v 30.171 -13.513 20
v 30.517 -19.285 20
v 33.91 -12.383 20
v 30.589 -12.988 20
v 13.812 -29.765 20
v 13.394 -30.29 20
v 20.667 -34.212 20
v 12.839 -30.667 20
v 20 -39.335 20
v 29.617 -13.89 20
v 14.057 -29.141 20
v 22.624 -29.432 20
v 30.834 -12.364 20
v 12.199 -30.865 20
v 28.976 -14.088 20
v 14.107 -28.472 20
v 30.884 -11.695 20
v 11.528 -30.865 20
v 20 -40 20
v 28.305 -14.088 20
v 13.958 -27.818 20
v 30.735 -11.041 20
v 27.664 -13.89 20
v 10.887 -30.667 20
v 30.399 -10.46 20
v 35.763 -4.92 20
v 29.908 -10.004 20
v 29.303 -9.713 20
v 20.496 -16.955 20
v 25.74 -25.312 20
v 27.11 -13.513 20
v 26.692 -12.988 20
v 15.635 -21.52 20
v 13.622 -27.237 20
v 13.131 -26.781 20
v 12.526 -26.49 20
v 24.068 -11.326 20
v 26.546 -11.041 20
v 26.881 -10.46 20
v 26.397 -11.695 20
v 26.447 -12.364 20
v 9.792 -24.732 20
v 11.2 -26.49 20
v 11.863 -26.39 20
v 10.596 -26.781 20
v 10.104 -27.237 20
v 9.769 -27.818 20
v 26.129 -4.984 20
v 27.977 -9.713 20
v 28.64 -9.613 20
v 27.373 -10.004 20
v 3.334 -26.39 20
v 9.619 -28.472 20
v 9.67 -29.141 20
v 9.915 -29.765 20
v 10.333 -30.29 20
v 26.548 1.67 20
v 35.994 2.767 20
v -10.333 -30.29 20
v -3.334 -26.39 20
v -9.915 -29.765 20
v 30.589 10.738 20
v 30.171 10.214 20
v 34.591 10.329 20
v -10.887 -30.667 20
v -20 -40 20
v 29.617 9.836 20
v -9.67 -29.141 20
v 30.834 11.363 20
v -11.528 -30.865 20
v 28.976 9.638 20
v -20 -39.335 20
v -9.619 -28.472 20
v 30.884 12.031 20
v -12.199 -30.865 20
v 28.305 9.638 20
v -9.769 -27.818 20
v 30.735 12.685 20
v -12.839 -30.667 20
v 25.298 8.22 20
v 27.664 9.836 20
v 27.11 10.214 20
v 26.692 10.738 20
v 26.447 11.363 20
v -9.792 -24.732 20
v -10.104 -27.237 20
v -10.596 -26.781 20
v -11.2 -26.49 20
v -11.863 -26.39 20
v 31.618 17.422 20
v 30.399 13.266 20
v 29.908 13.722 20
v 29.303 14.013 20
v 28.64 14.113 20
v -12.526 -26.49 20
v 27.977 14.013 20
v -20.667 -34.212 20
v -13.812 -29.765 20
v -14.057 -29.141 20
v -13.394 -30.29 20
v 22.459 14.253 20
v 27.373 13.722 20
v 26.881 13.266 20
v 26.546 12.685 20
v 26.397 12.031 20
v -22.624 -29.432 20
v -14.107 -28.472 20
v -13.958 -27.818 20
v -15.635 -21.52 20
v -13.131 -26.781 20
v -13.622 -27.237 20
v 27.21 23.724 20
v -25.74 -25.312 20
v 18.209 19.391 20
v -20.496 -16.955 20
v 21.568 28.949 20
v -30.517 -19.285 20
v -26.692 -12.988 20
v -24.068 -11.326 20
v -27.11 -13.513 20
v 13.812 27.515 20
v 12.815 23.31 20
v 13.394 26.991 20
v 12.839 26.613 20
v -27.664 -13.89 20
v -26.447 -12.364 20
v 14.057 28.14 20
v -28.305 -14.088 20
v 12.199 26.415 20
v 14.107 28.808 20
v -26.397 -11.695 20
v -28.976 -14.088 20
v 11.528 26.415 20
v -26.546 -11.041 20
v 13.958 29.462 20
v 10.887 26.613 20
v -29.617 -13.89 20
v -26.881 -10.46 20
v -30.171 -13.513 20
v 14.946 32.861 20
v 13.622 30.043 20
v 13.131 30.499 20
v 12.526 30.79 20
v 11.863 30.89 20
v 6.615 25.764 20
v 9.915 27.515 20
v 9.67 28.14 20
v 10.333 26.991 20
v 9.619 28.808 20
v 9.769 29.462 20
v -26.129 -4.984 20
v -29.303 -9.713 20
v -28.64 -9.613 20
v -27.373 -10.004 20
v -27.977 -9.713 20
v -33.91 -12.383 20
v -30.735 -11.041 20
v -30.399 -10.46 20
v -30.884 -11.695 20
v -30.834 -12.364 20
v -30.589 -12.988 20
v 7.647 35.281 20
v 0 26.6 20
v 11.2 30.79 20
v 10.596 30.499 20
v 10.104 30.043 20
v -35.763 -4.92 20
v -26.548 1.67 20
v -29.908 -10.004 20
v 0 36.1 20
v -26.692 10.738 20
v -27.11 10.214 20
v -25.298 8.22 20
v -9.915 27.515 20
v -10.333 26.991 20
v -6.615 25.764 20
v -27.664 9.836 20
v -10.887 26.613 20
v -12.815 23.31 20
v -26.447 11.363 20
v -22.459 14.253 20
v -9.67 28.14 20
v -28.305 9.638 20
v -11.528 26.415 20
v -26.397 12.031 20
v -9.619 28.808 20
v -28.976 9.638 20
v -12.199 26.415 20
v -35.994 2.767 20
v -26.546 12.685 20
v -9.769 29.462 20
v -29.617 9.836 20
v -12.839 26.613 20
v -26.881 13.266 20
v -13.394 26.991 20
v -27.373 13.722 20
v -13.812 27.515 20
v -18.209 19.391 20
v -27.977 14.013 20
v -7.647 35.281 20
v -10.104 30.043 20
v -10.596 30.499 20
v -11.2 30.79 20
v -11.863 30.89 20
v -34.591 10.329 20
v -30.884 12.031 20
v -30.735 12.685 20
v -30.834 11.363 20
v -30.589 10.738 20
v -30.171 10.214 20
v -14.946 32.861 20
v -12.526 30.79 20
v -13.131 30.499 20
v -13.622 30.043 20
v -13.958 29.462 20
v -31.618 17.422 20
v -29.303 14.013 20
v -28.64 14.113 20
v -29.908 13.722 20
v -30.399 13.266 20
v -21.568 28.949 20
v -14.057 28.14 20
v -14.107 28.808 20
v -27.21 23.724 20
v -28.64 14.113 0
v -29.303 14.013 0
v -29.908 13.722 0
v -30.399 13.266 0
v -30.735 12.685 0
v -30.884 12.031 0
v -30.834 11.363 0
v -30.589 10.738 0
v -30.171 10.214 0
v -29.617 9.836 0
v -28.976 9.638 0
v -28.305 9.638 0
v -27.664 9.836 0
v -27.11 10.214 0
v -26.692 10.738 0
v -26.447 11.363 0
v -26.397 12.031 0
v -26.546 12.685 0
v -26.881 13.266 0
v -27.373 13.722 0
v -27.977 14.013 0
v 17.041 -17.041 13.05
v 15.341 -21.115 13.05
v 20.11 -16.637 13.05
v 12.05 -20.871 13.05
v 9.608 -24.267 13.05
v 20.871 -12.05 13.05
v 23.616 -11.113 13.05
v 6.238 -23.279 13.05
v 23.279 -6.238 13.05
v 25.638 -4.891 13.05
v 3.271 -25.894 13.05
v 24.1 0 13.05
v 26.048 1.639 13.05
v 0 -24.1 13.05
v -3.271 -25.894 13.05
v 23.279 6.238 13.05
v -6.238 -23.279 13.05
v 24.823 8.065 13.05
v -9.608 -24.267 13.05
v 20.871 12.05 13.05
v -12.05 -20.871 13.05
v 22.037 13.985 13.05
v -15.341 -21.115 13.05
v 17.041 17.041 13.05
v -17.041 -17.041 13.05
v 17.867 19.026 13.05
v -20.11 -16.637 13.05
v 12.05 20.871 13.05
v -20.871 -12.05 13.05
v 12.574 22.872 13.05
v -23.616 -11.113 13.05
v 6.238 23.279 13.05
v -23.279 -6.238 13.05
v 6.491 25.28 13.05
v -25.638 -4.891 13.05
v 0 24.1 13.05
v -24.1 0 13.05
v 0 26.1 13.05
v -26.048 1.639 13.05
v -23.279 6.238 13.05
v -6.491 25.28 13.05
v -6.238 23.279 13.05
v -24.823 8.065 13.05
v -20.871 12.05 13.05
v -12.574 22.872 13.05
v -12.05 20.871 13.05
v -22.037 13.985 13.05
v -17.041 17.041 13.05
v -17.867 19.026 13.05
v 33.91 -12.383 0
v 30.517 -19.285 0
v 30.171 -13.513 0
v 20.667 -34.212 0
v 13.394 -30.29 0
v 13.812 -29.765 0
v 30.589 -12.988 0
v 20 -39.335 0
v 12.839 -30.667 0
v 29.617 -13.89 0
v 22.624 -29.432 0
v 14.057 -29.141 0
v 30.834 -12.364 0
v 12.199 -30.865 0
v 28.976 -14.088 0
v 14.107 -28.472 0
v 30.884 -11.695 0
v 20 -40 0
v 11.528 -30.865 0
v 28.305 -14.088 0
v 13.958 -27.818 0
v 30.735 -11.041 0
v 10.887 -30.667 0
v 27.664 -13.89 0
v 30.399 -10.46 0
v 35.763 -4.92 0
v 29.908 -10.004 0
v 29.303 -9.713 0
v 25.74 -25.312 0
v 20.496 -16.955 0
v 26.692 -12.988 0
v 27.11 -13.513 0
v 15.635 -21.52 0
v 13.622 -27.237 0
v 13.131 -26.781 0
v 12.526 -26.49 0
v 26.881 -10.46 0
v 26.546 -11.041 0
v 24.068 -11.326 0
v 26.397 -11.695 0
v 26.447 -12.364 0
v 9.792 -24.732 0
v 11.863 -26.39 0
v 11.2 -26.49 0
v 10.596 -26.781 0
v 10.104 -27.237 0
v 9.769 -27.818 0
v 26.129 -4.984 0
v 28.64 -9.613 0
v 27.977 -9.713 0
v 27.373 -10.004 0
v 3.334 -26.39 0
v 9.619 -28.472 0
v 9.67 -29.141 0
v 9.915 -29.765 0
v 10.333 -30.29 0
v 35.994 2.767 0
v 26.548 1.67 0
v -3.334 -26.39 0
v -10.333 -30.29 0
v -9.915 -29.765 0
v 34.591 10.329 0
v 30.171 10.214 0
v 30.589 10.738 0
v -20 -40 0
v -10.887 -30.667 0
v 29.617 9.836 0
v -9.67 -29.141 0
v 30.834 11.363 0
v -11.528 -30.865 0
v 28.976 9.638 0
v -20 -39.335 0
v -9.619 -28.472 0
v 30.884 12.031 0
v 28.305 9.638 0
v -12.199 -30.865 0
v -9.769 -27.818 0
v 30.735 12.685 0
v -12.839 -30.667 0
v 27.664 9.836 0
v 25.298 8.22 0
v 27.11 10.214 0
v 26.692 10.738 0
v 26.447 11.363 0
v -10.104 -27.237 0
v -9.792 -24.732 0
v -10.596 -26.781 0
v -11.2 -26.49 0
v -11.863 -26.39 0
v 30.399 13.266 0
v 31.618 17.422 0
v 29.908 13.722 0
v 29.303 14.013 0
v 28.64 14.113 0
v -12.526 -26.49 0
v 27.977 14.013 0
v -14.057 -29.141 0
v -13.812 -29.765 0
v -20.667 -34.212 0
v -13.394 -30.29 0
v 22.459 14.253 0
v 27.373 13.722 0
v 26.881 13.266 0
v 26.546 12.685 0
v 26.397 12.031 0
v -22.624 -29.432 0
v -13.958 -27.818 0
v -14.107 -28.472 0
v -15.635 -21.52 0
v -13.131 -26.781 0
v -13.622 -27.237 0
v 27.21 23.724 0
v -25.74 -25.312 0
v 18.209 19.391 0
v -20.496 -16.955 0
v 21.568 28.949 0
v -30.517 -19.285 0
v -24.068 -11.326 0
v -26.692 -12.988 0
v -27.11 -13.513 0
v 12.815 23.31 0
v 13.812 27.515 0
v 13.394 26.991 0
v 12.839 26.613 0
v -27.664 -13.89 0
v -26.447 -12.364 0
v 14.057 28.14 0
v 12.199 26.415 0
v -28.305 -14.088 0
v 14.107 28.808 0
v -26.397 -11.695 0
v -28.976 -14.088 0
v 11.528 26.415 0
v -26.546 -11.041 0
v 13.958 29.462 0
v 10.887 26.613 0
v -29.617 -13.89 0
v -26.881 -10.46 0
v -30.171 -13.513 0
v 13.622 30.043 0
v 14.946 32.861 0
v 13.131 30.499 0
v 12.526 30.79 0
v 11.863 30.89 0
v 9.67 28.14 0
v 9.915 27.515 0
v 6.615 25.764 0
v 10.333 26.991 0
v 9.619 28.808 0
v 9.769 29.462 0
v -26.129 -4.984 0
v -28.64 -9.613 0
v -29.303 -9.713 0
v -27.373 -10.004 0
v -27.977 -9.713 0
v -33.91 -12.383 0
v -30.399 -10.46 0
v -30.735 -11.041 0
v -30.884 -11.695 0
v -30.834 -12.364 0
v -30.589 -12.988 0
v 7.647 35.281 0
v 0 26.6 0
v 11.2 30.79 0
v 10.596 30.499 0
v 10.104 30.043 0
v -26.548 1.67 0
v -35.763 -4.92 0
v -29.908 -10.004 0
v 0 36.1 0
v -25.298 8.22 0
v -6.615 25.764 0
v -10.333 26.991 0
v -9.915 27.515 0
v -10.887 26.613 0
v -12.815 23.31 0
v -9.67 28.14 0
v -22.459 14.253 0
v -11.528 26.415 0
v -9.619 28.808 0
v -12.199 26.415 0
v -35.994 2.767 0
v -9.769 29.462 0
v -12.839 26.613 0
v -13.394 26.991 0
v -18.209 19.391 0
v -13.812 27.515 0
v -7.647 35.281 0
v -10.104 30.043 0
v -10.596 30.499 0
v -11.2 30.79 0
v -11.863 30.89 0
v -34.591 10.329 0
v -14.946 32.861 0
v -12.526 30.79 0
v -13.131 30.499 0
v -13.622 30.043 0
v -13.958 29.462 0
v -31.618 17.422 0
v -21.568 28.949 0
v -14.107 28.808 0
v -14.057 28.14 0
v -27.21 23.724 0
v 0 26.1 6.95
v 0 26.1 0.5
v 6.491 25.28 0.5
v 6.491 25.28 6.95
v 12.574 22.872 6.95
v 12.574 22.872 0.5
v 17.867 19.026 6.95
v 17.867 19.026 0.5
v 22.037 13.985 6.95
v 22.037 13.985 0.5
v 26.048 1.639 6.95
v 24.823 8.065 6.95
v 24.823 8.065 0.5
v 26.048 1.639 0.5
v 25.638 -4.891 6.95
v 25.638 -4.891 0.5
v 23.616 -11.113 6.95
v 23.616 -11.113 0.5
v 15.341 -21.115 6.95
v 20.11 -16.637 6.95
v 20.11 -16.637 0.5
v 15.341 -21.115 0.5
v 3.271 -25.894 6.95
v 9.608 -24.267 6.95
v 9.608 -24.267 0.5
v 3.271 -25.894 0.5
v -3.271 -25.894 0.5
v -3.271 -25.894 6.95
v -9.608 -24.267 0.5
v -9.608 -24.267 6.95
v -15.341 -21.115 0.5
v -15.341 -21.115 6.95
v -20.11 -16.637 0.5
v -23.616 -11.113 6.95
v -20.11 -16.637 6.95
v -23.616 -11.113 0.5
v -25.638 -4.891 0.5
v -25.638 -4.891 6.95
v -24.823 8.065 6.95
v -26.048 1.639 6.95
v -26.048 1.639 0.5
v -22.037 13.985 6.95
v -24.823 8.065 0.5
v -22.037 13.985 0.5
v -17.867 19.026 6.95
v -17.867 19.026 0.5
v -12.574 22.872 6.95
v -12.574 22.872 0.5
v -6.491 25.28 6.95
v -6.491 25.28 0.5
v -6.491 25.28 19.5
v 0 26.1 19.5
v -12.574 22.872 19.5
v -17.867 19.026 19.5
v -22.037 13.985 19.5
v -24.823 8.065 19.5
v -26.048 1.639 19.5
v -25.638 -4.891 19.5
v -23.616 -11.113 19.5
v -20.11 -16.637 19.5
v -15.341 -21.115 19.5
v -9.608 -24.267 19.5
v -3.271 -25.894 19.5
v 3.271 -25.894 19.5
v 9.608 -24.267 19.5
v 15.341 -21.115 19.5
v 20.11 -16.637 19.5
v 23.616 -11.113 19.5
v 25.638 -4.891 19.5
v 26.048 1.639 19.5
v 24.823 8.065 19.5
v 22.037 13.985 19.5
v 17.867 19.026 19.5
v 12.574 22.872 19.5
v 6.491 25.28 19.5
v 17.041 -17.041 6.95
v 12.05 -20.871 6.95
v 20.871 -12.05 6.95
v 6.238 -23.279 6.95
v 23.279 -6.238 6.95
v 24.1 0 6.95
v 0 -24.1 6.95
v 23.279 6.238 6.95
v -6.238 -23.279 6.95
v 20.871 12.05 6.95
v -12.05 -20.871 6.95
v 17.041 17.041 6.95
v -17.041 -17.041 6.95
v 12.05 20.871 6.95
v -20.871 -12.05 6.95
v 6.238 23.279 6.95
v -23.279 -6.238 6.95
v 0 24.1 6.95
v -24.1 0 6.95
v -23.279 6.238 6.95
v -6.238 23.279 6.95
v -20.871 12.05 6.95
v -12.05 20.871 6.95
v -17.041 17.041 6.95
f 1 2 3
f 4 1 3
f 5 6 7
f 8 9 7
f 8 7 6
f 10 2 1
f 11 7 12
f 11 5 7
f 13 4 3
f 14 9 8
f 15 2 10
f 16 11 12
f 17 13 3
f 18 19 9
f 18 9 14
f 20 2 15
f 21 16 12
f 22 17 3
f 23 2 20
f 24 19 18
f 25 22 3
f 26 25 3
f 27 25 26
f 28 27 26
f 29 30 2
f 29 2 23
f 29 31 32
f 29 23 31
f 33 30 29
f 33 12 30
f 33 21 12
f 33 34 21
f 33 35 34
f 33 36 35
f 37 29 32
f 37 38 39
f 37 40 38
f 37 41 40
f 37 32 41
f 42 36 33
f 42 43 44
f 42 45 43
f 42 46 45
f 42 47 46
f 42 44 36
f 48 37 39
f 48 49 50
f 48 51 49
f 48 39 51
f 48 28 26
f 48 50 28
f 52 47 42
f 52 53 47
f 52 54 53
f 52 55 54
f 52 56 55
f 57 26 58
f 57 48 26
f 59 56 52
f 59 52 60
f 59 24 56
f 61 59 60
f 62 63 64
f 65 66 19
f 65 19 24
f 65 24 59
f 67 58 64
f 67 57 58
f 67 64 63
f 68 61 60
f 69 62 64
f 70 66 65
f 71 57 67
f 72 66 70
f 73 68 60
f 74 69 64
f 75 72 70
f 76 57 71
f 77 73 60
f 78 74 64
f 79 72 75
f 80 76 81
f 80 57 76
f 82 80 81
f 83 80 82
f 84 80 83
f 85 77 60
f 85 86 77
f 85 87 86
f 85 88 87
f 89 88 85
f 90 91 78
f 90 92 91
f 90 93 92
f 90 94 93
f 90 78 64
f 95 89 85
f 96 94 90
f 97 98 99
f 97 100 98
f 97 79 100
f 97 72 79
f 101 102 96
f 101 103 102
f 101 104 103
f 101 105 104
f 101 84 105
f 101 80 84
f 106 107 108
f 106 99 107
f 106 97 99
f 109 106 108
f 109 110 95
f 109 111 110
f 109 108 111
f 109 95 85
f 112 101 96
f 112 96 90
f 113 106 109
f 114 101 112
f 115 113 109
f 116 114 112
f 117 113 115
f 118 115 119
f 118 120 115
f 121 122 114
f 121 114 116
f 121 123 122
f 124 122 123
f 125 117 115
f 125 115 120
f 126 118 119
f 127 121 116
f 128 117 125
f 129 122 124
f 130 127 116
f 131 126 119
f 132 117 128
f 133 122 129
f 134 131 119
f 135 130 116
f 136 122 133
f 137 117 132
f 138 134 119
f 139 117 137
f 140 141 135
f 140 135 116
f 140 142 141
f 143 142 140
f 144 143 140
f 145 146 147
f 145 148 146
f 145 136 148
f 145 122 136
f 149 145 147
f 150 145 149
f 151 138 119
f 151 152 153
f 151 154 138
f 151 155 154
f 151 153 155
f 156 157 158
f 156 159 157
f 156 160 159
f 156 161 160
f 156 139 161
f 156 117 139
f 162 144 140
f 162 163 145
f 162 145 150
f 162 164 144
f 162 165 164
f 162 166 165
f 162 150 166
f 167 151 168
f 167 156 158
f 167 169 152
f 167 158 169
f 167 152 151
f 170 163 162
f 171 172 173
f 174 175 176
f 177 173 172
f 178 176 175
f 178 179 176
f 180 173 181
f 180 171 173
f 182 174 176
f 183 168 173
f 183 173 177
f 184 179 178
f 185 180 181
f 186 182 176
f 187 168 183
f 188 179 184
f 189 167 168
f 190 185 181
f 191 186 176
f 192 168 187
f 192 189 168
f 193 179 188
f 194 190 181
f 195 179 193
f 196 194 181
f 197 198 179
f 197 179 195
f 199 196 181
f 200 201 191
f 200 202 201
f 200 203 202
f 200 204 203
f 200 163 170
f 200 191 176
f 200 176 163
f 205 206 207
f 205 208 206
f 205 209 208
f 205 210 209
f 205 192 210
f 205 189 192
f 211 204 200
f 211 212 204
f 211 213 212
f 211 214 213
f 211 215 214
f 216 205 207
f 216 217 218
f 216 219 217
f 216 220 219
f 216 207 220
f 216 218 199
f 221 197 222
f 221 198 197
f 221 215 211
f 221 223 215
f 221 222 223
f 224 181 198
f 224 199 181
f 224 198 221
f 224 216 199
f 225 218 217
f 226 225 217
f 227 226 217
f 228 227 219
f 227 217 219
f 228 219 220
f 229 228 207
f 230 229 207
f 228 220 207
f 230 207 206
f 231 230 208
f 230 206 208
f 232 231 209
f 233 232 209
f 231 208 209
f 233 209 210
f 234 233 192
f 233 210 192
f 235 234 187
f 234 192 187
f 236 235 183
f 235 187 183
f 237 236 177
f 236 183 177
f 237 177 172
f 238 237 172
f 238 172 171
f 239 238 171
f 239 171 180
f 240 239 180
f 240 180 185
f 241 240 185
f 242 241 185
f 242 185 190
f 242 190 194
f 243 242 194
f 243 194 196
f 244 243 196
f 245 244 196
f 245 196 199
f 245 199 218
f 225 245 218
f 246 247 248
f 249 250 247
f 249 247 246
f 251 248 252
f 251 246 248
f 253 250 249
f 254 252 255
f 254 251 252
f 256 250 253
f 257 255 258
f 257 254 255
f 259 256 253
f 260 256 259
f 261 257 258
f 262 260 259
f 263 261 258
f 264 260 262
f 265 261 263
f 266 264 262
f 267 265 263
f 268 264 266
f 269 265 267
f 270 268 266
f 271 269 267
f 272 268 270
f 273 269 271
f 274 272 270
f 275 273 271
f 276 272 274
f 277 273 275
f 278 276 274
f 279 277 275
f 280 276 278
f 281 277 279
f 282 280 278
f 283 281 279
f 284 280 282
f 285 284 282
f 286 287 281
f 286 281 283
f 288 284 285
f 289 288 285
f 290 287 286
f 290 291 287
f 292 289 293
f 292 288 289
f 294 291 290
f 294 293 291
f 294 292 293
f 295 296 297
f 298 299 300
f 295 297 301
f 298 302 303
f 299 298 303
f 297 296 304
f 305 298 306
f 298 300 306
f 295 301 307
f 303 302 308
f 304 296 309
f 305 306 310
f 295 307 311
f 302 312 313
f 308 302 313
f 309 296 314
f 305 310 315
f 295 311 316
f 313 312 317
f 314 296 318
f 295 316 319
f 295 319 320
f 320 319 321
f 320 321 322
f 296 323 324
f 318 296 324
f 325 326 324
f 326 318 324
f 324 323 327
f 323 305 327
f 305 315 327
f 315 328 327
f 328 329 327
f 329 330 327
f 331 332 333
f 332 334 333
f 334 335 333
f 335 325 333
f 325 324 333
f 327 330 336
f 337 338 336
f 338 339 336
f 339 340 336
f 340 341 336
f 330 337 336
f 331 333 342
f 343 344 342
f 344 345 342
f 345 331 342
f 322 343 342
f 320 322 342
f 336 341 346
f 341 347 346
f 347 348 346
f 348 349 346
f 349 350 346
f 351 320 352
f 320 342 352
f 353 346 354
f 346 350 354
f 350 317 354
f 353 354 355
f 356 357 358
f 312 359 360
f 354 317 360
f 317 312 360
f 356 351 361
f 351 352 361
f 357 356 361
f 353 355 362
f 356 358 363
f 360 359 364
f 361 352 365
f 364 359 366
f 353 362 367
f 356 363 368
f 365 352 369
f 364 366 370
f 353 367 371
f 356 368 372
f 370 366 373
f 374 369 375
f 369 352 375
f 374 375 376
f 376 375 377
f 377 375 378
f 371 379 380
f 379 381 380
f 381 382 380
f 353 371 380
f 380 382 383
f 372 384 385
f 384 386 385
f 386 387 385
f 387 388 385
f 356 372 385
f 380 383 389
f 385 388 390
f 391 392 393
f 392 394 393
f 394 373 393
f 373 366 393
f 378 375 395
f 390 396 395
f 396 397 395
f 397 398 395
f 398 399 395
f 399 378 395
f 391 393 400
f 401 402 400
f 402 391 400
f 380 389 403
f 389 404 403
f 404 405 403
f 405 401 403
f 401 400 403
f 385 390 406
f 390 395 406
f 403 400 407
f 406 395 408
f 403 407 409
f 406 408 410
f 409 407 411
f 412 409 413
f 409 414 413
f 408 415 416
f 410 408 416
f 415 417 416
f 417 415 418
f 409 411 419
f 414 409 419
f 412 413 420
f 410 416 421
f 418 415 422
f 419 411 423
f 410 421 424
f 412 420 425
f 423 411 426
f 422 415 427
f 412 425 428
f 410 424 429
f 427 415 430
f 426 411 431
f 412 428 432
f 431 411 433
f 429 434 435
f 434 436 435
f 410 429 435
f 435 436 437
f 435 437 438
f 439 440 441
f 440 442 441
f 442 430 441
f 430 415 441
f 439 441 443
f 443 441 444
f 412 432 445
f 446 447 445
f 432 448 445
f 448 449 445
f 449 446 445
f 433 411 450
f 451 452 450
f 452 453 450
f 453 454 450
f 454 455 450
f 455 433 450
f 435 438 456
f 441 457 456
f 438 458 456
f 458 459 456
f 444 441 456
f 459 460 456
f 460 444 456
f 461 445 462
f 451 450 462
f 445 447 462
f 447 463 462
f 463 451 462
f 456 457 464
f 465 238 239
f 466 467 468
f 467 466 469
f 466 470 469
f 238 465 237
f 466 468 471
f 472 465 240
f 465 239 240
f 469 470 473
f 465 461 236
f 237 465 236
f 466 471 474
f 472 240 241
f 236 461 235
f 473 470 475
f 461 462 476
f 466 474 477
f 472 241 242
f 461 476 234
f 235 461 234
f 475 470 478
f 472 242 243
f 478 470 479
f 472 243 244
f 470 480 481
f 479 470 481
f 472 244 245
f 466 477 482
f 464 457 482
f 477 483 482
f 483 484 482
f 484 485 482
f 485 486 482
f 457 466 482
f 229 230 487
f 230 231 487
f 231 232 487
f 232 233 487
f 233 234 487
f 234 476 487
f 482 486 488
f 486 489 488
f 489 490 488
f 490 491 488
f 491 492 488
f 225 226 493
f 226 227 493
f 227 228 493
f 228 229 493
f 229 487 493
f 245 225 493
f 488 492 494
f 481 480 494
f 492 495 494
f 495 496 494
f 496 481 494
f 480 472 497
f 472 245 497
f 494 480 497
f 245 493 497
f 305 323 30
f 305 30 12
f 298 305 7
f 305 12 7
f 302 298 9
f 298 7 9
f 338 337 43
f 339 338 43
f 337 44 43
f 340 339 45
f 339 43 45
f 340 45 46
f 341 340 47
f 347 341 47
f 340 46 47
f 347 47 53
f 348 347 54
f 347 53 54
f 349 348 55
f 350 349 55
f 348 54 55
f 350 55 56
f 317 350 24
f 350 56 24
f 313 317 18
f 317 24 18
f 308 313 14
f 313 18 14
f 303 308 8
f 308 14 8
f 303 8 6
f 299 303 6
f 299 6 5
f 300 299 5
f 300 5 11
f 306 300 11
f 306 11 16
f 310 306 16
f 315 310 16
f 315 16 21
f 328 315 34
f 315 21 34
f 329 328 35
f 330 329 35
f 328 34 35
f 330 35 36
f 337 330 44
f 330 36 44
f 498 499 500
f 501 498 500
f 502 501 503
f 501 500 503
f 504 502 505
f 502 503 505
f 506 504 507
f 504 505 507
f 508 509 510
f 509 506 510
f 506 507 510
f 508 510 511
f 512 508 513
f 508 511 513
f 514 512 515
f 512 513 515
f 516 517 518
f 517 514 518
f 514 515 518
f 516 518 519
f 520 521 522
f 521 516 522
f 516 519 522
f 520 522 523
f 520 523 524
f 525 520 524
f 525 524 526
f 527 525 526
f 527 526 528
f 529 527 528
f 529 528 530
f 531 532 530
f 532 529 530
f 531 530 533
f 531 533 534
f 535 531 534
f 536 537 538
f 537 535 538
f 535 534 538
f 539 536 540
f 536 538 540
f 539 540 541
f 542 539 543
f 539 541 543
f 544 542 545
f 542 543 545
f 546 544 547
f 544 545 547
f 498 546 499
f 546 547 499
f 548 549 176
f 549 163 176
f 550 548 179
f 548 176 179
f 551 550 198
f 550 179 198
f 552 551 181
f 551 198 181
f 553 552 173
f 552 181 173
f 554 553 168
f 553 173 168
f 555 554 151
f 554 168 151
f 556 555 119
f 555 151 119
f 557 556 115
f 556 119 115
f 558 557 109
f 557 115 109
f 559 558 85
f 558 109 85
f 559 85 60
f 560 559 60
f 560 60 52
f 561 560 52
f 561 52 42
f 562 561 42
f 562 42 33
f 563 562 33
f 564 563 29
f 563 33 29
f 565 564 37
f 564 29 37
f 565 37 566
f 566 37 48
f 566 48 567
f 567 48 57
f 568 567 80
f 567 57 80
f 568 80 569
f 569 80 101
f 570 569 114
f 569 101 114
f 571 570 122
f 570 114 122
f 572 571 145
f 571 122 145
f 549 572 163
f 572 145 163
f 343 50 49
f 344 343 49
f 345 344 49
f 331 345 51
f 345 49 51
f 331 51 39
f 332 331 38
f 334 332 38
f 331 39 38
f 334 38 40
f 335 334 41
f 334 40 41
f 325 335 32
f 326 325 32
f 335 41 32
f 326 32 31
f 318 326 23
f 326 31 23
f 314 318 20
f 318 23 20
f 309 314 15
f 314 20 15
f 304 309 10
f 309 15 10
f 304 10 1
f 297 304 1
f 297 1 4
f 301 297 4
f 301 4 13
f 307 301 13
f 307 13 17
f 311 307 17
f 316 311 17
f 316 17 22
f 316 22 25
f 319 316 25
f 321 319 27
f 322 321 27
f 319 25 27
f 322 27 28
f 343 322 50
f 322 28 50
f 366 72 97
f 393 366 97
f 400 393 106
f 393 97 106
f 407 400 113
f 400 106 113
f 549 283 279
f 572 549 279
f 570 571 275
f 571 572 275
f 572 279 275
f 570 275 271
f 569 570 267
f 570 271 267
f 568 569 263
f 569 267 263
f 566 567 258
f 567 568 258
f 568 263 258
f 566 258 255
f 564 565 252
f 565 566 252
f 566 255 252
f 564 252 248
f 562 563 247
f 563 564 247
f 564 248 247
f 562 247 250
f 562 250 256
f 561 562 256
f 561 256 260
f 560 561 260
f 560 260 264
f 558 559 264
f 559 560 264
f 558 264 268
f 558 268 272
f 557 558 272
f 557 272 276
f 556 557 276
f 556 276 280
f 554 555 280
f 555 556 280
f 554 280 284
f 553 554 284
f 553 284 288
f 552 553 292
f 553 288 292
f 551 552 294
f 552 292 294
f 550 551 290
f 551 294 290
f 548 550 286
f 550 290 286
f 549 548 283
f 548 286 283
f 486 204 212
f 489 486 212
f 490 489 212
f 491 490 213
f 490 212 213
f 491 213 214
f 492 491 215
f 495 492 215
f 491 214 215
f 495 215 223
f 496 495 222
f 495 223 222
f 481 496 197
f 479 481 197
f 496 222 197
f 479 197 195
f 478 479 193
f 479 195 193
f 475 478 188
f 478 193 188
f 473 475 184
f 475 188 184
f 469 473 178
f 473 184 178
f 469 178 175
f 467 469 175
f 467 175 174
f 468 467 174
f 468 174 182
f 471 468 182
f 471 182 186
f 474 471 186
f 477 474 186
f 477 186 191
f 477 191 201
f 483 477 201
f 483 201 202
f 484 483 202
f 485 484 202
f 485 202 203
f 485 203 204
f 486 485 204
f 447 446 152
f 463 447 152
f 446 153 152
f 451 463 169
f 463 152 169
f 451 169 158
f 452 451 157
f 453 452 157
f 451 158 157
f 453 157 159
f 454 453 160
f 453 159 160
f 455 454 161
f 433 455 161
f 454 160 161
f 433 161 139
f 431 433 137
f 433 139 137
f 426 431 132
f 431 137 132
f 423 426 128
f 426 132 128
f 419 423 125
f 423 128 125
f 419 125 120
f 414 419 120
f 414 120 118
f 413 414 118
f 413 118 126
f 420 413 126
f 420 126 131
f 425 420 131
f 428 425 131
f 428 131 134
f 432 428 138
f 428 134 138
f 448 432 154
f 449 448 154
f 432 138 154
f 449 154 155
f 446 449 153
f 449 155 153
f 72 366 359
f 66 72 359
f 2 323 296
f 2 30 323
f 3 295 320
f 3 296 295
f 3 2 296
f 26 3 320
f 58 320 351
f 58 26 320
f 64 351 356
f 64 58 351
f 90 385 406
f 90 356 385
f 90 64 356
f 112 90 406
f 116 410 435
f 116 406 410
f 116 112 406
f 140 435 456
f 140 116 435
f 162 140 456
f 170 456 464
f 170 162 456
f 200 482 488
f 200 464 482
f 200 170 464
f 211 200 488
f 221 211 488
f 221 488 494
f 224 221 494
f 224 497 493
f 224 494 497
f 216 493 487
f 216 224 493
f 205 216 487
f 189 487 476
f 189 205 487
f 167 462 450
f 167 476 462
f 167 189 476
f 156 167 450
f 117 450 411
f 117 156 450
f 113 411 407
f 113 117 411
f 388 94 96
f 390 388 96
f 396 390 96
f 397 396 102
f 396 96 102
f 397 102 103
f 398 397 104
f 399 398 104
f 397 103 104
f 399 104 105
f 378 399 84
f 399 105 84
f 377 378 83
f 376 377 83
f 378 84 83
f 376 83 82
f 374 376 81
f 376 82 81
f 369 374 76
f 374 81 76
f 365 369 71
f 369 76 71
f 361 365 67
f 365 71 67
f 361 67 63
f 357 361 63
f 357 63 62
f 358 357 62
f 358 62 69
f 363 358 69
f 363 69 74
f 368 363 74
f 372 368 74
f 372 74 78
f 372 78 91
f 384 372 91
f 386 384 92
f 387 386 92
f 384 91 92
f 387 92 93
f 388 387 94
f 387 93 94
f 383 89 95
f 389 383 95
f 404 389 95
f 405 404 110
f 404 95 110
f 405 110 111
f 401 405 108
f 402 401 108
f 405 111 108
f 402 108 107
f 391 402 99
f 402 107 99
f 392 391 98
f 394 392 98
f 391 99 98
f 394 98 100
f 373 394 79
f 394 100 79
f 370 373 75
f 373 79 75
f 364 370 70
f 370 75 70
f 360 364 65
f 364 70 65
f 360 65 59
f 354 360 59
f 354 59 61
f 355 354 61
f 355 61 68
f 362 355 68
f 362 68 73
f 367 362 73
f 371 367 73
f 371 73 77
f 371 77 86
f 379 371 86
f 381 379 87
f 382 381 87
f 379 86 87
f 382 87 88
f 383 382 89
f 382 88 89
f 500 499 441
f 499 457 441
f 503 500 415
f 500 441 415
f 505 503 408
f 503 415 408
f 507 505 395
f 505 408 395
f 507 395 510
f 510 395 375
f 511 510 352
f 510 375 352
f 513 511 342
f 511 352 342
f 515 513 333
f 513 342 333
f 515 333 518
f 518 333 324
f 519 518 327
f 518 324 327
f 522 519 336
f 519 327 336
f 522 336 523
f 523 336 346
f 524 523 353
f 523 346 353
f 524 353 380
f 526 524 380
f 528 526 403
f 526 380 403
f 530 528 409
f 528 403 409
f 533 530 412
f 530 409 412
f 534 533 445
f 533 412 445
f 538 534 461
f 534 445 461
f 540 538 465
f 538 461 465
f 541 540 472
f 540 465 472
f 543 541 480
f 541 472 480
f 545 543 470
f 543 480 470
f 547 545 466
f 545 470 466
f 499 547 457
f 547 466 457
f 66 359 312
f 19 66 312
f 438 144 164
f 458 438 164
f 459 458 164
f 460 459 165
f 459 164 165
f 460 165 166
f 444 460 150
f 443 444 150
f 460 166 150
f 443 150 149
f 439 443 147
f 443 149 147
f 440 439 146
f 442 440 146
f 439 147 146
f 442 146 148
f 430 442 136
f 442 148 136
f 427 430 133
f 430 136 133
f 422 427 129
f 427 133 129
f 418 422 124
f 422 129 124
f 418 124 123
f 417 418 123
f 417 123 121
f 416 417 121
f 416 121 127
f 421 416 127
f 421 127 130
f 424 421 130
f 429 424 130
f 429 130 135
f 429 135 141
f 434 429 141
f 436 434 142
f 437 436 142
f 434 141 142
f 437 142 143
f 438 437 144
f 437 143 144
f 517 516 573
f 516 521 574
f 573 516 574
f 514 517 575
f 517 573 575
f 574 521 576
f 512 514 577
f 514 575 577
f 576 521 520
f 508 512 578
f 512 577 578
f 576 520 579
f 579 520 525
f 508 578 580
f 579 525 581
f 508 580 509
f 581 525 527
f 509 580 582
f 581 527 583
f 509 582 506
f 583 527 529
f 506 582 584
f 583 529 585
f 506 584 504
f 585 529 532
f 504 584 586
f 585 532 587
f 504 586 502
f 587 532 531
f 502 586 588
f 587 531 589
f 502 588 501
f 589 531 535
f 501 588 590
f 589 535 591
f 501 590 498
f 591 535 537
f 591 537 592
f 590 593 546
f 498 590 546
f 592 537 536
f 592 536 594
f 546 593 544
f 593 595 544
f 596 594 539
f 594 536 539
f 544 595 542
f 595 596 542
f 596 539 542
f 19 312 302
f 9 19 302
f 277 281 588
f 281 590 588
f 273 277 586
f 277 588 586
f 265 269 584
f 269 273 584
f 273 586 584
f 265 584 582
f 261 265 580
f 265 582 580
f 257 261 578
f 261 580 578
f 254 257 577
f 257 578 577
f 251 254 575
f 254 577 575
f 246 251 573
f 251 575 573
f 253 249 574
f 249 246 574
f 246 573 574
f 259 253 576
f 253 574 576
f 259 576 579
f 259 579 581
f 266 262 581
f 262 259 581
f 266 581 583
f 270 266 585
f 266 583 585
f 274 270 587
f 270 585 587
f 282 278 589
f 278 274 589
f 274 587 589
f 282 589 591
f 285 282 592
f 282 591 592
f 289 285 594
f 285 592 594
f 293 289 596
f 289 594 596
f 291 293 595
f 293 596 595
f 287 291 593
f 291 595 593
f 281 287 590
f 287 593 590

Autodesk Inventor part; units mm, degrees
ref_plane "YZ Plane" through (0, 0, 0) normal (1, 0, 0) x (0, 1, 0)
ref_plane "XZ Plane" through (0, 0, 0) normal (0, 1, 0) x (-1, 0, 0)
ref_plane "XY Plane" through (0, 0, 0) normal (0, 0, 1) x (1, 0, 0)
sketch "スケッチ1" plane through (0, 0, 0) normal (1, 0, 0) x (0, 1, 0)
  line L0 (26.1, 0) -> (36.1, 0)
  line L1 (36.1, 0) -> (36.1, 20)
  line L2 (36.1, 20) -> (26.1, 20)
  line L3 (26.1, 20) -> (26.1, 13.05)
  line L4 (26.1, 13.05) -> (24.1, 13.05)
  line L5 (0, -4) -> (0, 24) projected
  line L6 (24.1, 13.05) -> (24.1, 6.95)
  line L7 (24.1, 6.95) -> (26.1, 6.95)
  line L8 (26.1, 6.95) -> (26.1, 0)
  point P0 (0, 0)
  dimension "d0" = 26.1
  dimension "d2" = 6.95
  dimension "d3" = 20
  dimension "d4" = 10
  dimension "d28" = 2
  dimension "d29" = 6.95
revolve "回転1" add sketch "スケッチ1" angle 360 about axis through (0, 0, -10) along (0, 0, 1)
sketch "スケッチ2" plane through (0, 0, 0) normal (0, 0, -1) x (-1, 0, 0)
  circle A0 centre (0, 0) radius 31
  point P0 (-11.8632, 28.6403)
  point P1 (-28.6403, 11.8632)
  point P2 (-28.6403, -11.8632)
  point P3 (-11.8632, -28.6403)
  point P4 (11.8632, -28.6403)
  point P5 (28.6403, -11.8632)
  point P6 (28.6403, 11.8632)
  point P7 (11.8632, 28.6403)
  dimension "d6" = 62
  dimension "d9" = 360
  dimension "d25" = 0
hole "穴1" at (11.8632, 28.6403, 0) at (28.6403, 11.8632, 0) at (28.6403, -11.8632, 0) at (11.8632, -28.6403, 0) at (-11.8632, -28.6403, 0) at (-28.6403, -11.8632, 0) at (-28.6403, 11.8632, 0) at (-11.8632, 28.6403, 0) direction (0, 0, 1) diameter 4.5 end through all clearance for "Flat Head Machine Screw" size "M4" standard "Ansi Metric M Profile"
chamfer "面取り1" distance 0.5 angle 45 2 edges at (0, -26.1, 20) (0, -26.1, 0)
sketch "スケッチ3" plane through (0, 0, 0) normal (0, 0, -1) x (-1, 0, 0)
  line L0 (-20, -30.0535) -> (20, -30.0535)
  line L1 (20, -30.0535) -> (20, -40)
  line L2 (20, -40) -> (-20, -40)
  line L3 (-20, -40) -> (-20, -30.0535)
  line L4 (-20, -30.0535) -> (20, -40) construction
  line L5 (20, -30.0535) -> (-20, -40) construction
  circle A0 centre (0, 0) radius 36.1 projected
  point P0 (0, -35.0267)
  point P1 (0, -35.0267)
  point P2 (20, -30.0535)
  dimension "d21" = 40
  dimension "d22" = 40
extrude "押し出し1" add sketch "スケッチ3" against normal up to surface (20 mm away) contours A0 L1 L2 L3
fillet "フィレット2" radius 20 2 edges at (20, -30.0535, 10) (-20, -30.0535, 10)
ref_plane "作業平面1" through (-20, -40, 10) normal (0, 0, 1) x (1, 0, 0)
equation "\"d29\" = d2"
properties part number "scara-base15" material "ABS プラスチック"
